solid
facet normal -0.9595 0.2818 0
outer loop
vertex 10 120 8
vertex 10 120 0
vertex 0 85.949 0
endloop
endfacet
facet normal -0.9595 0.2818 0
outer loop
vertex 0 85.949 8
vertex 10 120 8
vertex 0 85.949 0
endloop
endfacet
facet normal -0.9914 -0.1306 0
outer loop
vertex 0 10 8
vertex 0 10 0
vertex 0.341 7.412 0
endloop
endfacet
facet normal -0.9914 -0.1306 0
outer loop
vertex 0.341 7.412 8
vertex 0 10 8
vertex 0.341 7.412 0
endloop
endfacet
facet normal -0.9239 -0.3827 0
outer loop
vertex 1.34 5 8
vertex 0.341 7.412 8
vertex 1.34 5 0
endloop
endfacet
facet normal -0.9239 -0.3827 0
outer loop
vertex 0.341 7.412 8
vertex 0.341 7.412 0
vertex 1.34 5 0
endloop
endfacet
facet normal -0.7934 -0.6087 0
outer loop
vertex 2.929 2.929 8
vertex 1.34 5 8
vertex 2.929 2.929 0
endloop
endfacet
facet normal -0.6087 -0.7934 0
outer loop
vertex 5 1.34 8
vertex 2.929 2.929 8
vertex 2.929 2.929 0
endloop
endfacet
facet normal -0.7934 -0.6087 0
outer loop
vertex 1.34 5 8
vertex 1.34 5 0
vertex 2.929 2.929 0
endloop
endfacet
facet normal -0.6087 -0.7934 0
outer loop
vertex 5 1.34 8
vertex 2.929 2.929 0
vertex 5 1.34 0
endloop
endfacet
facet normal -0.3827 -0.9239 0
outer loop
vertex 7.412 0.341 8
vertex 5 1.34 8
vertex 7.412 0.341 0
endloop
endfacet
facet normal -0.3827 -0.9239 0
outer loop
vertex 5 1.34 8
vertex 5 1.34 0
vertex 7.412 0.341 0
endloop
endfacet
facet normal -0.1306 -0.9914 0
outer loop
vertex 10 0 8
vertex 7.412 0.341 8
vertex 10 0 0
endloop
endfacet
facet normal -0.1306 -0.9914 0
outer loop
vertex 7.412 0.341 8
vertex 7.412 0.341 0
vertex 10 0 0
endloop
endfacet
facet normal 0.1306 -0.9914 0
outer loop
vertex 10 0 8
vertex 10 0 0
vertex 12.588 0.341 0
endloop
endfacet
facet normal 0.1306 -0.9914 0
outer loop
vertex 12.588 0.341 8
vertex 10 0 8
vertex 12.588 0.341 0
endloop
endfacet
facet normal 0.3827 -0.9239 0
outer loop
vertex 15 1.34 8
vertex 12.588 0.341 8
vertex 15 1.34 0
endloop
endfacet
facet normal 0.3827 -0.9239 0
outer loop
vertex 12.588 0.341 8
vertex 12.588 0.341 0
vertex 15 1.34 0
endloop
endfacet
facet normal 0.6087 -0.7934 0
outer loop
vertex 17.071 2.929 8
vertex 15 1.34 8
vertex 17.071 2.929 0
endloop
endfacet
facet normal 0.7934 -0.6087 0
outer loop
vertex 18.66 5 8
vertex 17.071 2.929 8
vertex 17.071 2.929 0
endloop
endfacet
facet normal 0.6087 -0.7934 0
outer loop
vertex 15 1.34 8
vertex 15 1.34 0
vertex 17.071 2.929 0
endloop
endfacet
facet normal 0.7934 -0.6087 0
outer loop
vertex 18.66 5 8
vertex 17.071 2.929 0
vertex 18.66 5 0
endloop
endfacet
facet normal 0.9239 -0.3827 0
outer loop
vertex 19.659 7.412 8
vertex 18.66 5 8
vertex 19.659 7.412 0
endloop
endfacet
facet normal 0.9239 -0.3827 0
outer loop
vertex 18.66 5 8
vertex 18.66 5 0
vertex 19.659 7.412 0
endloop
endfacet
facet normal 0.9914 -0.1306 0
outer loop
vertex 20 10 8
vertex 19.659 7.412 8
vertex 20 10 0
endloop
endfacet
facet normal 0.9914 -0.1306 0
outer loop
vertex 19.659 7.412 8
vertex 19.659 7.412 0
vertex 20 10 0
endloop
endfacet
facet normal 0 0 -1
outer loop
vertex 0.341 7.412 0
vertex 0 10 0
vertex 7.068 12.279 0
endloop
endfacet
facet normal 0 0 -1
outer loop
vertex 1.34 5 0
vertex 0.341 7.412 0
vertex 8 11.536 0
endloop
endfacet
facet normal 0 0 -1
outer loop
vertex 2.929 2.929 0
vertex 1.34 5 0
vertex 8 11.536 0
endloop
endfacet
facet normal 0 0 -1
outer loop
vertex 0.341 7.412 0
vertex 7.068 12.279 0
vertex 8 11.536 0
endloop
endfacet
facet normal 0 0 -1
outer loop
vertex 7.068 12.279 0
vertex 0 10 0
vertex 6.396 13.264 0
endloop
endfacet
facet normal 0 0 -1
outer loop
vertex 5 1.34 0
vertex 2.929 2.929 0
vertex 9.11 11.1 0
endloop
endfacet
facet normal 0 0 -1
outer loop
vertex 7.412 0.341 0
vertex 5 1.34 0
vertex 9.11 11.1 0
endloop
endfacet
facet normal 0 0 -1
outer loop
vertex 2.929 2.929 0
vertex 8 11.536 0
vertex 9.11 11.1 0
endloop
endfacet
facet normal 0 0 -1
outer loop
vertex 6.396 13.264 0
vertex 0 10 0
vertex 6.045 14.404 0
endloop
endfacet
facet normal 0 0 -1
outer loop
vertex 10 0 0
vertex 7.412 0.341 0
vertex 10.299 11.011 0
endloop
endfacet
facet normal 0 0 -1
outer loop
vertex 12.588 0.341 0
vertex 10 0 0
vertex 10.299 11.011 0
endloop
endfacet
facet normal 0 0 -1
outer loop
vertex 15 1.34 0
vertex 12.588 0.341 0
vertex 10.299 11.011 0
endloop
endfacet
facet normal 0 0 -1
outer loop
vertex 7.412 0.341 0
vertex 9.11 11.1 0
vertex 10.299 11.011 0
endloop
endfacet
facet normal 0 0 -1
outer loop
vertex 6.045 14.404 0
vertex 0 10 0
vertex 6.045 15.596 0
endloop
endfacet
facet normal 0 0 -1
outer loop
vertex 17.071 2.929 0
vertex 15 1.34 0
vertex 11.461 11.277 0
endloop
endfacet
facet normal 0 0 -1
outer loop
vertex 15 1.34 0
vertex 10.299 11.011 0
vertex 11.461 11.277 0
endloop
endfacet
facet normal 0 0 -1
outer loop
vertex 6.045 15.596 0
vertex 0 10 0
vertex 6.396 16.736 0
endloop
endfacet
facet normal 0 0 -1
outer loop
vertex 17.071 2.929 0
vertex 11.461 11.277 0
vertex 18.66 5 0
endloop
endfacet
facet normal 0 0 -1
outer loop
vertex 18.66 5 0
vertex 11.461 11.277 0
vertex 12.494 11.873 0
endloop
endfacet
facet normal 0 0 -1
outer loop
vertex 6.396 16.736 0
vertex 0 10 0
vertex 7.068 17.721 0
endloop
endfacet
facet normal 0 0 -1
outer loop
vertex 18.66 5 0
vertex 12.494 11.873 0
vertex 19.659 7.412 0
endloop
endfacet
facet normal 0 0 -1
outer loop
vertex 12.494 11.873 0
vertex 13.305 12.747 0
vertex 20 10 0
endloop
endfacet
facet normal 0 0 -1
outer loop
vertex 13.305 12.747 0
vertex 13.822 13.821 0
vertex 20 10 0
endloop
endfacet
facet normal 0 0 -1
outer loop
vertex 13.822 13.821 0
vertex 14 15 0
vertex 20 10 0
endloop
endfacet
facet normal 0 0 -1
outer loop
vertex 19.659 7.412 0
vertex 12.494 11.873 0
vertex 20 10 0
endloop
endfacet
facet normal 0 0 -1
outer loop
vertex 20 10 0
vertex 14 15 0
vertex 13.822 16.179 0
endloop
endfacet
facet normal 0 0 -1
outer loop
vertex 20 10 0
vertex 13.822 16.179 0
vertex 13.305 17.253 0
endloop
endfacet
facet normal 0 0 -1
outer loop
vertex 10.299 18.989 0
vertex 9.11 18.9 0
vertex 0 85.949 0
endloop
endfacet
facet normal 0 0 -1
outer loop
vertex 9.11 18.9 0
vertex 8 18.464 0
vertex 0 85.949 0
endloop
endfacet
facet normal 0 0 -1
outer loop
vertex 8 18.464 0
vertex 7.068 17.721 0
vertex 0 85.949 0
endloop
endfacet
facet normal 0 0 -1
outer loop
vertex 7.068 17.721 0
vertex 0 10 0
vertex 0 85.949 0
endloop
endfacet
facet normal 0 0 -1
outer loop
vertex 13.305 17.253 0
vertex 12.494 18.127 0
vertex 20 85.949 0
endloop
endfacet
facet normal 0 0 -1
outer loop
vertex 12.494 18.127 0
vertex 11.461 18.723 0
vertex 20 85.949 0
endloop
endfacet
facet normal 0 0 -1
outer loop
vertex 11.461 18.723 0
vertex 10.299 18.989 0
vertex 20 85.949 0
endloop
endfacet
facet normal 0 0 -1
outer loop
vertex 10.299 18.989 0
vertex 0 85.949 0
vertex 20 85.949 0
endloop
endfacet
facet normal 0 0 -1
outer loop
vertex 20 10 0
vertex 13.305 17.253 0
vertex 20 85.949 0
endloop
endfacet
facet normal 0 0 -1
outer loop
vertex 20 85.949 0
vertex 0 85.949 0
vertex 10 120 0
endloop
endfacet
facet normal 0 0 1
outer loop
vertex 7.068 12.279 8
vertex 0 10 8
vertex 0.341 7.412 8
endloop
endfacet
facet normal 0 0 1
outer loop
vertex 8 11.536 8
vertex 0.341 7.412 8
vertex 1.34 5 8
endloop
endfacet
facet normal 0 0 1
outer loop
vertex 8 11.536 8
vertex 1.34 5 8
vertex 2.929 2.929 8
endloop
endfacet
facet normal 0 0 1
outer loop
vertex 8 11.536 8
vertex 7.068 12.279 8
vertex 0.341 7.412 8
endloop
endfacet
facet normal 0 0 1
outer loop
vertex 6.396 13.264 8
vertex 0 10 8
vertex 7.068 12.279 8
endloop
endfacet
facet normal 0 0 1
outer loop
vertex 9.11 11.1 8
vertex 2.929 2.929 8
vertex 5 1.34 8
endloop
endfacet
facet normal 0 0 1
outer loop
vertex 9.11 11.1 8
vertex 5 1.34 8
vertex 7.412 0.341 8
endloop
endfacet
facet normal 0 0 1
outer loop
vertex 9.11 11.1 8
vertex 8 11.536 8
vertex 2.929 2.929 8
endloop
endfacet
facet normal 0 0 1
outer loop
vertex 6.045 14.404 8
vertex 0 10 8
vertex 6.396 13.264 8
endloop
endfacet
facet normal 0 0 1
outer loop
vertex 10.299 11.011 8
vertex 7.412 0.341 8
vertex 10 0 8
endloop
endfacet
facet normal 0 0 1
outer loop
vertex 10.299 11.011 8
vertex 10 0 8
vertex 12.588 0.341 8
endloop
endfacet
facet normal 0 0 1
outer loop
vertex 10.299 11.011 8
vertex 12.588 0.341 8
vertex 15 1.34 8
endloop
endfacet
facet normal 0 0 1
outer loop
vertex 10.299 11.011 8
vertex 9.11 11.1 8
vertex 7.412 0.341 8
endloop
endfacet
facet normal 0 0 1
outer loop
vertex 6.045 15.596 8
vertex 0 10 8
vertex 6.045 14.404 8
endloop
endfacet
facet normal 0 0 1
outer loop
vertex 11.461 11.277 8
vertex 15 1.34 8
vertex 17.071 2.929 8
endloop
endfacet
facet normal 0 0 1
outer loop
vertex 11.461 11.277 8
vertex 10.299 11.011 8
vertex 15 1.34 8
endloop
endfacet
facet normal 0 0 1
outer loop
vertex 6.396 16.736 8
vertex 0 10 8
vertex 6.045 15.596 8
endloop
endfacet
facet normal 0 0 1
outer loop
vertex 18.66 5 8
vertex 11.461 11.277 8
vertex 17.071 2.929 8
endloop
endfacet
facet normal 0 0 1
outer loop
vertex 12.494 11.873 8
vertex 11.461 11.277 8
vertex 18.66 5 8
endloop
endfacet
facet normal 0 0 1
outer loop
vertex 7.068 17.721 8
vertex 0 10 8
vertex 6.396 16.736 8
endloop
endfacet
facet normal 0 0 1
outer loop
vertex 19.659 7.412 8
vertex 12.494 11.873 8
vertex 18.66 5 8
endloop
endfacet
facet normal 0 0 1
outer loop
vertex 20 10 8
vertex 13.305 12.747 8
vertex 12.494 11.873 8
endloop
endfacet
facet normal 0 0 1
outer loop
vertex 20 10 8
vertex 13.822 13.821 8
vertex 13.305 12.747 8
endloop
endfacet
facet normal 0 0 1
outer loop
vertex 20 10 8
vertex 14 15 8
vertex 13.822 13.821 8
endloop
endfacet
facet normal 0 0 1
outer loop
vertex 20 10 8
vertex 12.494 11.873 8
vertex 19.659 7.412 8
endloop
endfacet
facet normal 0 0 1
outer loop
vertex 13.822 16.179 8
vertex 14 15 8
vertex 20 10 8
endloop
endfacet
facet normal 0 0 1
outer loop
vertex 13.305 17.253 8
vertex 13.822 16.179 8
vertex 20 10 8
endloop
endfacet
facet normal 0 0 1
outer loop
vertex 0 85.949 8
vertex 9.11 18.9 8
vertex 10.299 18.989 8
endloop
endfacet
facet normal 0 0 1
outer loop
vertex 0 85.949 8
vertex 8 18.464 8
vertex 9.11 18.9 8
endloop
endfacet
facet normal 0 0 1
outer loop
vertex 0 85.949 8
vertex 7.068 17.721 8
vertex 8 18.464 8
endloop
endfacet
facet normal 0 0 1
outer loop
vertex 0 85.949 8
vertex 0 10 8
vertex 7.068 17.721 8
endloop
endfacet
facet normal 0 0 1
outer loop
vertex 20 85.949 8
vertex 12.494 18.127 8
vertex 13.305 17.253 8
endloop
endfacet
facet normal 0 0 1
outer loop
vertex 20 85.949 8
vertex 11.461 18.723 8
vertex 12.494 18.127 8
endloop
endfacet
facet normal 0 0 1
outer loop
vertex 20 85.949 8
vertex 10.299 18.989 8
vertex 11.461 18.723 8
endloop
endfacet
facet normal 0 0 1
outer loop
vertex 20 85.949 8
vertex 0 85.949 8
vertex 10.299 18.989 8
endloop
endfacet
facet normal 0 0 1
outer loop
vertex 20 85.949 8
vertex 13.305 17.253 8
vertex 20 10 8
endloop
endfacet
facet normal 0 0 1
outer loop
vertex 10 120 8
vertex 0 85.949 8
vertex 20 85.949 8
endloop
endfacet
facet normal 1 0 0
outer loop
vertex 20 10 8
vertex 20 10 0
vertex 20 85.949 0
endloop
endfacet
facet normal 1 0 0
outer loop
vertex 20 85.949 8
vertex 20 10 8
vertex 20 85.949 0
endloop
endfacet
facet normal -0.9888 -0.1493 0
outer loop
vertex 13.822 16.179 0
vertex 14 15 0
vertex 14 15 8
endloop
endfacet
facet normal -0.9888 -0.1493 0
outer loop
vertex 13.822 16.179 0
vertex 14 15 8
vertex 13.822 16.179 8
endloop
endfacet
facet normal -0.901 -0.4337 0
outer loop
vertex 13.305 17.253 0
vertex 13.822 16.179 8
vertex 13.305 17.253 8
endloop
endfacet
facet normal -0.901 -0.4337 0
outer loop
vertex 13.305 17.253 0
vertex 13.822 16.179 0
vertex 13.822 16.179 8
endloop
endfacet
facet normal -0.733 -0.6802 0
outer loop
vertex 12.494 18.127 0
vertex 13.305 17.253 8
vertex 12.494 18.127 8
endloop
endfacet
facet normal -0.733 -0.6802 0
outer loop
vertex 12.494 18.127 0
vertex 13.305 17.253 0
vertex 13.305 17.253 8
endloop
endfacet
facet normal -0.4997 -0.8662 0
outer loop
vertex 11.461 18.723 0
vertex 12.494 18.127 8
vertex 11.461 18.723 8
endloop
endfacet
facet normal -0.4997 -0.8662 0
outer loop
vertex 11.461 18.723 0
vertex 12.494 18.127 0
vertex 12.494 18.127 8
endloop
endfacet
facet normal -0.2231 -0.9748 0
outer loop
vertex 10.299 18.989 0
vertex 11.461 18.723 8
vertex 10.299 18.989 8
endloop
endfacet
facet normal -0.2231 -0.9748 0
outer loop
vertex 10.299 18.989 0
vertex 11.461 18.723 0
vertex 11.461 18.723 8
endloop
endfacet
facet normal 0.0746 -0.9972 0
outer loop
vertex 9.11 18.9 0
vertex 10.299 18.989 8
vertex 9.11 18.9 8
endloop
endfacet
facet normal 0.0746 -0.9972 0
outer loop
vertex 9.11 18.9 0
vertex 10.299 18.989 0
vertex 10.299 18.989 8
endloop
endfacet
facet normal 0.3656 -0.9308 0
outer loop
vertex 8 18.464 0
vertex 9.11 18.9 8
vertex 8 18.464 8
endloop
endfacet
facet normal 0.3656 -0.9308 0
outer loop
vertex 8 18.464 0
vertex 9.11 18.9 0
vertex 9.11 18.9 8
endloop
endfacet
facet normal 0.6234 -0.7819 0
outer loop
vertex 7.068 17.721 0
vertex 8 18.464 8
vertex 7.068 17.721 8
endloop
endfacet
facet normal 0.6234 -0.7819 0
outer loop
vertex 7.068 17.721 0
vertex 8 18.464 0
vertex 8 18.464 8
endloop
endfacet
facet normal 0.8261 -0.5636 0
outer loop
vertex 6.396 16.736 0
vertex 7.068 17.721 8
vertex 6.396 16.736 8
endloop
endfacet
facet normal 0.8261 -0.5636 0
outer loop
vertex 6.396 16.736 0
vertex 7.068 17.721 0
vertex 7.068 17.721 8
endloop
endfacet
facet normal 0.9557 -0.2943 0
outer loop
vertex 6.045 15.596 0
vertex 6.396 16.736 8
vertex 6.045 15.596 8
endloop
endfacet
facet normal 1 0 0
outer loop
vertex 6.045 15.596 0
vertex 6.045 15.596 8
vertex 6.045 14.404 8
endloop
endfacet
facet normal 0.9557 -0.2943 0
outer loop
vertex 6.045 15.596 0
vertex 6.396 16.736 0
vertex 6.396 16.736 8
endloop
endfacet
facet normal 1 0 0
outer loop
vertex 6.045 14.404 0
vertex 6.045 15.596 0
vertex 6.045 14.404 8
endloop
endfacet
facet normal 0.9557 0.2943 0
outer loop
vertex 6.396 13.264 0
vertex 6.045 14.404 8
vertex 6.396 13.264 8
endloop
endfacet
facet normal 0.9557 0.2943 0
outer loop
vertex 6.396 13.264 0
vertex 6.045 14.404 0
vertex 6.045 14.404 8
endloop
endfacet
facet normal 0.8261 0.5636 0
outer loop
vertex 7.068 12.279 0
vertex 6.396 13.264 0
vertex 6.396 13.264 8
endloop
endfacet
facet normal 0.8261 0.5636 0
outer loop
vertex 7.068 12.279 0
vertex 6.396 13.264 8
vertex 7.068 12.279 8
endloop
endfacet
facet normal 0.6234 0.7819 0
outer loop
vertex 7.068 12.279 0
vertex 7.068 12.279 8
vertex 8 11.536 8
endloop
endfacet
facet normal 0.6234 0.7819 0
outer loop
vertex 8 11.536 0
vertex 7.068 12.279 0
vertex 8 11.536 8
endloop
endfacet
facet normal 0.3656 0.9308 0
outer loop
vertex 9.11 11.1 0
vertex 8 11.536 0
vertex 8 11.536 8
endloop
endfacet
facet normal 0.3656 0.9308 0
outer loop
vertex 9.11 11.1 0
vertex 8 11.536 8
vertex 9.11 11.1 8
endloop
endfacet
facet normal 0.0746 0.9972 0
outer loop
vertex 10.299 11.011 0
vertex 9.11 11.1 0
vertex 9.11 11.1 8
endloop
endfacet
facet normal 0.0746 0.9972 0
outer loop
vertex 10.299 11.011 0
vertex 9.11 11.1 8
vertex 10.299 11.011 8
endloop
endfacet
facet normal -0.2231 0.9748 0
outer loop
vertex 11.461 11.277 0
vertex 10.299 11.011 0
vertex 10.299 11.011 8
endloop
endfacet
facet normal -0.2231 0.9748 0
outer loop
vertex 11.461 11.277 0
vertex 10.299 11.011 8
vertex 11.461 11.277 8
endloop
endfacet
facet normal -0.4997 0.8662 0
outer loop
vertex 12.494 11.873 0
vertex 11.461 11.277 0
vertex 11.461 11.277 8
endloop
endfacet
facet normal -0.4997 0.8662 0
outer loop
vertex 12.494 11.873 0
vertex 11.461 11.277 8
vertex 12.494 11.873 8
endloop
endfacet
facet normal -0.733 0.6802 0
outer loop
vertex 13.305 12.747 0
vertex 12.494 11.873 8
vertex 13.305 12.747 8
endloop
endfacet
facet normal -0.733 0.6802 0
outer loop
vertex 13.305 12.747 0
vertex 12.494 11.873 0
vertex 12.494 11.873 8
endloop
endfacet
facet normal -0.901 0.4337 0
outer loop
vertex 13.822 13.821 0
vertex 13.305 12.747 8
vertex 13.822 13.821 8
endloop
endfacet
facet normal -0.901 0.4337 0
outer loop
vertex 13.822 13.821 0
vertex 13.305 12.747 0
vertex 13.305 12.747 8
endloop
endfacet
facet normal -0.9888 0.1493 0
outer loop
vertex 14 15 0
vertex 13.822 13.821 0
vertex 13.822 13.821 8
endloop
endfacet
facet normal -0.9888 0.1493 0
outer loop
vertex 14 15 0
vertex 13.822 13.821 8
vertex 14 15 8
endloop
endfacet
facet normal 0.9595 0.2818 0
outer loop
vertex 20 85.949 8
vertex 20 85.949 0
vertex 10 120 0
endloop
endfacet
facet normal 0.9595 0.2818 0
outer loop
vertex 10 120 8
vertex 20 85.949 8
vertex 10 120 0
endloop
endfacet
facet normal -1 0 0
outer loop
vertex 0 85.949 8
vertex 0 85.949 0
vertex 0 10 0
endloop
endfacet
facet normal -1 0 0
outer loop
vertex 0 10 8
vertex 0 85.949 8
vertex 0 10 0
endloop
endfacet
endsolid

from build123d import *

# Parameters (mm, degrees)
F0_R     = 4
F1_DEPTH = 8


with BuildPart() as f1:
    # F0 (on Top) → F1 (new body)
    with BuildSketch(Plane.XY):
        with BuildLine():
            Line((0, 85.948586), (0, 10))
            ThreePointArc((0, 10), (2.928932, 2.928932), (10, 0))
            ThreePointArc((10, 0), (17.071068, 2.928932), (20, 10))
            Line((20, 10), (20, 85.948586))
            Line((20, 85.948586), (10, 120))
            Line((10, 120), (0, 85.948586))
        make_face()
        with Locations((10, 15)):
            Circle(F0_R, mode=Mode.SUBTRACT)
    extrude(amount=F1_DEPTH)


solid = f1.part
